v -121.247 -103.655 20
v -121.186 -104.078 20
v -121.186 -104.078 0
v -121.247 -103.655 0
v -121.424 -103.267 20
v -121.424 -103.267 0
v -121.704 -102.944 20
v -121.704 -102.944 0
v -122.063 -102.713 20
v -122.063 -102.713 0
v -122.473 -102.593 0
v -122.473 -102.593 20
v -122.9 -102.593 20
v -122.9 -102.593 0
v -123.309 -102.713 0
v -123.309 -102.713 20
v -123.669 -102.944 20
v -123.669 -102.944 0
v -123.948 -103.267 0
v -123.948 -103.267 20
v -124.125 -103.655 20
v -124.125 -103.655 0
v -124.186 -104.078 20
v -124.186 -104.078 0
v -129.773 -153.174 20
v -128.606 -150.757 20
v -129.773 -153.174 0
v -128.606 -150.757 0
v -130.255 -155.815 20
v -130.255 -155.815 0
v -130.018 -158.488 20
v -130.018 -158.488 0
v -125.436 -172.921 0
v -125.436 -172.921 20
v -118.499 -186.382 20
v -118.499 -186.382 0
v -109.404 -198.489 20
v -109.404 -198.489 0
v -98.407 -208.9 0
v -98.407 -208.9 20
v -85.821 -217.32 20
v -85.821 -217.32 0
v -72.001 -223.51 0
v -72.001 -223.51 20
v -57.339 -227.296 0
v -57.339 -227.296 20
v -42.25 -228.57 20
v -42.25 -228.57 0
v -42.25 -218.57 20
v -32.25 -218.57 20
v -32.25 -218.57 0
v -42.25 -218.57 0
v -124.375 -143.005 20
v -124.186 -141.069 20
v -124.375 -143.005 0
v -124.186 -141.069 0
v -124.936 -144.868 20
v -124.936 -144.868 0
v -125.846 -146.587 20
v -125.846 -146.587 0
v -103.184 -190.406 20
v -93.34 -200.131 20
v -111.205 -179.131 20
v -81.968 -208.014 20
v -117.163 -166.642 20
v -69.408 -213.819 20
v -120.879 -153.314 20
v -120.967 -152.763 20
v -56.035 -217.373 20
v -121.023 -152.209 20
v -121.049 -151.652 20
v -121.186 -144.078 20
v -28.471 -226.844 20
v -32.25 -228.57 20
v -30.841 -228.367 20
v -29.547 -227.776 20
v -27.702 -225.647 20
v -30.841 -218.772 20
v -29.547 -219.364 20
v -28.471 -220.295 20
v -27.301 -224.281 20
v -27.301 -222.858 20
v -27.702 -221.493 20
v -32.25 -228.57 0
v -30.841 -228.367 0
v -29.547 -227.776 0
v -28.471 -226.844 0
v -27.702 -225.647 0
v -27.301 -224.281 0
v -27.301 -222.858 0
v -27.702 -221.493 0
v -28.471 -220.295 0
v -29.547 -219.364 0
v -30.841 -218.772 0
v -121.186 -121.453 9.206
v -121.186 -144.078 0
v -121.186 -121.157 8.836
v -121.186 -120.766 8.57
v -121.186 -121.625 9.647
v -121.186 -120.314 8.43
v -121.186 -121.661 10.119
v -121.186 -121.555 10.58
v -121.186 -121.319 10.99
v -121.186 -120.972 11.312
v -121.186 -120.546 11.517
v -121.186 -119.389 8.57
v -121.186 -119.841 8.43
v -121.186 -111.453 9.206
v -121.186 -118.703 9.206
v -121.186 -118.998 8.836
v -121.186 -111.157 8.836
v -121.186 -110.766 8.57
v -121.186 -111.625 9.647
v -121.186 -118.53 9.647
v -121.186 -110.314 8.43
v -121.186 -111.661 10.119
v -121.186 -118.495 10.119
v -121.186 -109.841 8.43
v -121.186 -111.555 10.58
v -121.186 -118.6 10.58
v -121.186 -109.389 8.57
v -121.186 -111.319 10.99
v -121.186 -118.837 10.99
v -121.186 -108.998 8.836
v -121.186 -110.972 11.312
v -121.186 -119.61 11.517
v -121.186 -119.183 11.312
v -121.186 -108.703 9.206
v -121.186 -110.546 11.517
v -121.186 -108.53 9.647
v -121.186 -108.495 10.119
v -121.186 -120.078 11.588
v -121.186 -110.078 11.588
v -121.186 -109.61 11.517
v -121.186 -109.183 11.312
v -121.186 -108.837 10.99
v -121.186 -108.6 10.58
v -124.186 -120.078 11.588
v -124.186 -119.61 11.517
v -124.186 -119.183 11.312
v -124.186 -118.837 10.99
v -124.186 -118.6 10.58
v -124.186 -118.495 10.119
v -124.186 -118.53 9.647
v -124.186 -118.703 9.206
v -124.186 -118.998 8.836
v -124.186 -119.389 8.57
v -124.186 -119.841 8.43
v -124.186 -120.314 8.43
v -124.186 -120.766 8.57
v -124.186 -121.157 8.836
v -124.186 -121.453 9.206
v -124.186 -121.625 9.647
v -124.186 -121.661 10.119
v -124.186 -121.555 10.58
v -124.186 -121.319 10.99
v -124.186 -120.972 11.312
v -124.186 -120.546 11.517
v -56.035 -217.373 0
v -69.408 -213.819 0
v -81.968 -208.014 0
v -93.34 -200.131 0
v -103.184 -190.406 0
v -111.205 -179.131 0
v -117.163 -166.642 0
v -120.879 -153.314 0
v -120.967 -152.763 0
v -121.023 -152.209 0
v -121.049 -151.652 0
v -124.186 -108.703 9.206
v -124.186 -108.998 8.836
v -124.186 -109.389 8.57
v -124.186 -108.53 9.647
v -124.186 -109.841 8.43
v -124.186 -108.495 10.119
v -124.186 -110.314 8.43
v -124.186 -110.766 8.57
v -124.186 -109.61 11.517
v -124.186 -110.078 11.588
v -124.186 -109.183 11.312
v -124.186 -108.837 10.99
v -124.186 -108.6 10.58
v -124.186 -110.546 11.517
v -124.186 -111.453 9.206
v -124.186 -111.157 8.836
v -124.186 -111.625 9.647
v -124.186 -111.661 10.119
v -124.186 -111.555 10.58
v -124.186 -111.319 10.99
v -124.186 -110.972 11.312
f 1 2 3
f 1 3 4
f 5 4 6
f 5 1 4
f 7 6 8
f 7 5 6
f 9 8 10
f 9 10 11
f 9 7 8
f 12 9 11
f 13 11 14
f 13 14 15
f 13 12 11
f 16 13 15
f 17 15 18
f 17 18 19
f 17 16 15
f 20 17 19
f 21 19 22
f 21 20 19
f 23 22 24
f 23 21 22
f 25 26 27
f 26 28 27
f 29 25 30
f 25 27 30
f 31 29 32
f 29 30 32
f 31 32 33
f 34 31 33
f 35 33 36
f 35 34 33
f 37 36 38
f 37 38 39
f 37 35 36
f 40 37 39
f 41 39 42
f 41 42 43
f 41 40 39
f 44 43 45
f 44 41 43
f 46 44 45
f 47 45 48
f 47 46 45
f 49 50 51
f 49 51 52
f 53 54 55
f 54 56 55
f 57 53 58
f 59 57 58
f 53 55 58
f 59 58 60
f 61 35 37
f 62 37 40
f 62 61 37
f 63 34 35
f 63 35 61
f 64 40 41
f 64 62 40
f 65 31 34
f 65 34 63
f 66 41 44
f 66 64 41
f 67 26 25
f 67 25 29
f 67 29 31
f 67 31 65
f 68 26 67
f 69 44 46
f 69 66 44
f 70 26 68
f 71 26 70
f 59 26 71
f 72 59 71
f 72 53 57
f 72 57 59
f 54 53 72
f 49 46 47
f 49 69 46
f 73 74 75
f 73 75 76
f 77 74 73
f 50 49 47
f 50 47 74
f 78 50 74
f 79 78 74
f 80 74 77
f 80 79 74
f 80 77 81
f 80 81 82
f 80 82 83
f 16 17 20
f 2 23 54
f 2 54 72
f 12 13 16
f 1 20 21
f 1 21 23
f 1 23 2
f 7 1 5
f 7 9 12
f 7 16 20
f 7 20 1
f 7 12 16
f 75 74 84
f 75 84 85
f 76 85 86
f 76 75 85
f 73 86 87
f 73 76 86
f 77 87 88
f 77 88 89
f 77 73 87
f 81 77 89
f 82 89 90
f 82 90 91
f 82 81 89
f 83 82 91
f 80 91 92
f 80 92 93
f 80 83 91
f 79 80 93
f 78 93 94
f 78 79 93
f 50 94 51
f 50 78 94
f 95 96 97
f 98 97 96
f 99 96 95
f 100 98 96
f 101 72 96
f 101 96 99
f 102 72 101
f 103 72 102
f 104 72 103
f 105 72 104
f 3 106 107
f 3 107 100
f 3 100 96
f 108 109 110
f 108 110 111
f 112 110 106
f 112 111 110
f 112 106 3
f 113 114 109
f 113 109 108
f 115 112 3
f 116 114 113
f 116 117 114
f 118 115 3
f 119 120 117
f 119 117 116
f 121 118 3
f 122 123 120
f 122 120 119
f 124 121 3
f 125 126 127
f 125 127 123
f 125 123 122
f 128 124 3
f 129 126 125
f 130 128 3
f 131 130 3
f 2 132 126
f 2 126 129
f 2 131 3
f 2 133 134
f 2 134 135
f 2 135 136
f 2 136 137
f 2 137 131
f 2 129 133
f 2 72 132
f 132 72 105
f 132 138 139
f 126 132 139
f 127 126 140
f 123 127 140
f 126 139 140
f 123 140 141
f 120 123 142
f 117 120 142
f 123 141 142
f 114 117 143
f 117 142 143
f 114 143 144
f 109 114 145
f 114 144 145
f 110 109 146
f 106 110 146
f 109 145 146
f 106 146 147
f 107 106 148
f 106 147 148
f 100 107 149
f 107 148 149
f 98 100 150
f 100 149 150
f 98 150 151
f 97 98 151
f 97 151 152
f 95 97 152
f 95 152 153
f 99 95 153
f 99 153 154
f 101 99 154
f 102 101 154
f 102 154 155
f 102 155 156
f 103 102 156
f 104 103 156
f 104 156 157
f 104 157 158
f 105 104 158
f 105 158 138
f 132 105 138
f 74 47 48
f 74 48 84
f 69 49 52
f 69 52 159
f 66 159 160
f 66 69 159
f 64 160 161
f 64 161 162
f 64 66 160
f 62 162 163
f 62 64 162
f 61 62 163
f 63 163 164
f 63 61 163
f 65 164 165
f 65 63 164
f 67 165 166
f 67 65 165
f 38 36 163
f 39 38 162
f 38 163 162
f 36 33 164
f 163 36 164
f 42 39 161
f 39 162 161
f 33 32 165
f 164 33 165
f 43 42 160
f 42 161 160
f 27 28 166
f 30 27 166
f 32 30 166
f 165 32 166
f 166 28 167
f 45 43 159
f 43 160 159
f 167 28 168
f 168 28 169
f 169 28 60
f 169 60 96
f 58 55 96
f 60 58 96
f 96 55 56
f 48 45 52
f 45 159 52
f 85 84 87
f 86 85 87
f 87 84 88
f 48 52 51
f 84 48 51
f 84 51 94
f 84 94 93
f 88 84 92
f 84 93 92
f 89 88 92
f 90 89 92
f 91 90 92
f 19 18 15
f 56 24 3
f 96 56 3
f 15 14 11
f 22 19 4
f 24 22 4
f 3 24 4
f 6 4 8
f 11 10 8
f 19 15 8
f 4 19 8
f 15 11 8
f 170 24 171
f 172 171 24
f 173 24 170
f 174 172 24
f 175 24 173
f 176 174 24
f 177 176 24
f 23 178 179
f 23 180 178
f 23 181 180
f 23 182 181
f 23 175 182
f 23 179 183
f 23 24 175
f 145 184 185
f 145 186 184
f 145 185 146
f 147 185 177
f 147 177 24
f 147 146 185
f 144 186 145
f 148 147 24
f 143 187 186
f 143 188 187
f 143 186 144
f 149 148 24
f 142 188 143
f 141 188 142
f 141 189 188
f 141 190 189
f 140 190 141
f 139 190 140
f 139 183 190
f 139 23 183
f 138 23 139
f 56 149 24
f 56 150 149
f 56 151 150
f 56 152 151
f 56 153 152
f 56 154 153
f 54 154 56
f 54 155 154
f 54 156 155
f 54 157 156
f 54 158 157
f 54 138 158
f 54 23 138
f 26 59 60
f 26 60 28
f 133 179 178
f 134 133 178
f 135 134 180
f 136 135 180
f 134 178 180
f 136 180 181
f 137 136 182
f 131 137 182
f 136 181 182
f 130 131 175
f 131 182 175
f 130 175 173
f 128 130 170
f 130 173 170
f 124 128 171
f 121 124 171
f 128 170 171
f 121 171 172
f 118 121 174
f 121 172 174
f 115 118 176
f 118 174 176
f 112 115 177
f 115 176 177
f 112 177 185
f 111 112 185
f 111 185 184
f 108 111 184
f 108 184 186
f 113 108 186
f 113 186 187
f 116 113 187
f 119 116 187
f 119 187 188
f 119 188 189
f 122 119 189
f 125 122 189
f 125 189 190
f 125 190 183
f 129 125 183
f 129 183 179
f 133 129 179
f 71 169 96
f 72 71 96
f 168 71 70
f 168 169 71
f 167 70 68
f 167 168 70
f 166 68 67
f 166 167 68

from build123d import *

# Parameters (mm, degrees)
BOSS_EXTRUDE1_DEPTH              = 20
F_1_8_0_125_DIAMETER_HOLE1_D     = 3.175
F_1_8_0_125_DIAMETER_HOLE1_DEPTH = 9.69615506
FILLET1_R                        = 10


with BuildPart() as part:
    # Sketch1 → Boss-Extrude1 (new body)
    with BuildSketch(Plane.XY.offset(20)):
        with BuildLine():
            Line((-121.03432752, -152.461637247), (-121.18624999, -144.077694208))
            Line((-121.18624999, -144.077694208), (-121.18624999, -104.077694208))
            ThreePointArc((-121.18624999, -104.077694208), (-122.68624999, -102.577694208), (-124.18624999, -104.077694208))
            Line((-124.18624999, -104.077694208), (-124.18624999, -144.077694208))
            Line((-124.18624999, -144.077694208), (-130.88240505, -154.198119024))
            ThreePointArc((-130.88240505, -154.198119024), (-100.100592151, -207.513782914), (-42.249707279, -228.569783034))
            Line((-42.249707279, -228.569783034), (-32.249707279, -228.569783034))
            ThreePointArc((-32.249707279, -228.569783034), (-27.249707279, -223.569783034), (-32.249707279, -218.569783034))
            Line((-32.249707279, -218.569783034), (-42.249707279, -218.569783034))
            ThreePointArc((-42.249707279, -218.569783034), (-93.672716054, -199.853338483), (-121.03432752, -152.461637247))
        make_face()
    extrude(amount=-BOSS_EXTRUDE1_DEPTH)

    # 1/8 (0.125) Diameter Hole1
    with Locations(Plane(origin=(-121.18624999, 0, 0), x_dir=(0, 0, -1), z_dir=(1, 0, 0))):
        with Locations((-10, -120.077694208), (-10, -110.077694208)):
            Hole(F_1_8_0_125_DIAMETER_HOLE1_D / 2, depth=F_1_8_0_125_DIAMETER_HOLE1_DEPTH)

    # Fillet1
    fillet1_edges = [part.edges().sort_by_distance(p)[0] for p in [
        (-130.88240505, -154.198119024, 10),
        (-124.18624999, -144.077694208, 10),
        (-121.03432752, -152.461637247, 10),
    ]]
    fillet(fillet1_edges, radius=FILLET1_R)


solid = part.part
